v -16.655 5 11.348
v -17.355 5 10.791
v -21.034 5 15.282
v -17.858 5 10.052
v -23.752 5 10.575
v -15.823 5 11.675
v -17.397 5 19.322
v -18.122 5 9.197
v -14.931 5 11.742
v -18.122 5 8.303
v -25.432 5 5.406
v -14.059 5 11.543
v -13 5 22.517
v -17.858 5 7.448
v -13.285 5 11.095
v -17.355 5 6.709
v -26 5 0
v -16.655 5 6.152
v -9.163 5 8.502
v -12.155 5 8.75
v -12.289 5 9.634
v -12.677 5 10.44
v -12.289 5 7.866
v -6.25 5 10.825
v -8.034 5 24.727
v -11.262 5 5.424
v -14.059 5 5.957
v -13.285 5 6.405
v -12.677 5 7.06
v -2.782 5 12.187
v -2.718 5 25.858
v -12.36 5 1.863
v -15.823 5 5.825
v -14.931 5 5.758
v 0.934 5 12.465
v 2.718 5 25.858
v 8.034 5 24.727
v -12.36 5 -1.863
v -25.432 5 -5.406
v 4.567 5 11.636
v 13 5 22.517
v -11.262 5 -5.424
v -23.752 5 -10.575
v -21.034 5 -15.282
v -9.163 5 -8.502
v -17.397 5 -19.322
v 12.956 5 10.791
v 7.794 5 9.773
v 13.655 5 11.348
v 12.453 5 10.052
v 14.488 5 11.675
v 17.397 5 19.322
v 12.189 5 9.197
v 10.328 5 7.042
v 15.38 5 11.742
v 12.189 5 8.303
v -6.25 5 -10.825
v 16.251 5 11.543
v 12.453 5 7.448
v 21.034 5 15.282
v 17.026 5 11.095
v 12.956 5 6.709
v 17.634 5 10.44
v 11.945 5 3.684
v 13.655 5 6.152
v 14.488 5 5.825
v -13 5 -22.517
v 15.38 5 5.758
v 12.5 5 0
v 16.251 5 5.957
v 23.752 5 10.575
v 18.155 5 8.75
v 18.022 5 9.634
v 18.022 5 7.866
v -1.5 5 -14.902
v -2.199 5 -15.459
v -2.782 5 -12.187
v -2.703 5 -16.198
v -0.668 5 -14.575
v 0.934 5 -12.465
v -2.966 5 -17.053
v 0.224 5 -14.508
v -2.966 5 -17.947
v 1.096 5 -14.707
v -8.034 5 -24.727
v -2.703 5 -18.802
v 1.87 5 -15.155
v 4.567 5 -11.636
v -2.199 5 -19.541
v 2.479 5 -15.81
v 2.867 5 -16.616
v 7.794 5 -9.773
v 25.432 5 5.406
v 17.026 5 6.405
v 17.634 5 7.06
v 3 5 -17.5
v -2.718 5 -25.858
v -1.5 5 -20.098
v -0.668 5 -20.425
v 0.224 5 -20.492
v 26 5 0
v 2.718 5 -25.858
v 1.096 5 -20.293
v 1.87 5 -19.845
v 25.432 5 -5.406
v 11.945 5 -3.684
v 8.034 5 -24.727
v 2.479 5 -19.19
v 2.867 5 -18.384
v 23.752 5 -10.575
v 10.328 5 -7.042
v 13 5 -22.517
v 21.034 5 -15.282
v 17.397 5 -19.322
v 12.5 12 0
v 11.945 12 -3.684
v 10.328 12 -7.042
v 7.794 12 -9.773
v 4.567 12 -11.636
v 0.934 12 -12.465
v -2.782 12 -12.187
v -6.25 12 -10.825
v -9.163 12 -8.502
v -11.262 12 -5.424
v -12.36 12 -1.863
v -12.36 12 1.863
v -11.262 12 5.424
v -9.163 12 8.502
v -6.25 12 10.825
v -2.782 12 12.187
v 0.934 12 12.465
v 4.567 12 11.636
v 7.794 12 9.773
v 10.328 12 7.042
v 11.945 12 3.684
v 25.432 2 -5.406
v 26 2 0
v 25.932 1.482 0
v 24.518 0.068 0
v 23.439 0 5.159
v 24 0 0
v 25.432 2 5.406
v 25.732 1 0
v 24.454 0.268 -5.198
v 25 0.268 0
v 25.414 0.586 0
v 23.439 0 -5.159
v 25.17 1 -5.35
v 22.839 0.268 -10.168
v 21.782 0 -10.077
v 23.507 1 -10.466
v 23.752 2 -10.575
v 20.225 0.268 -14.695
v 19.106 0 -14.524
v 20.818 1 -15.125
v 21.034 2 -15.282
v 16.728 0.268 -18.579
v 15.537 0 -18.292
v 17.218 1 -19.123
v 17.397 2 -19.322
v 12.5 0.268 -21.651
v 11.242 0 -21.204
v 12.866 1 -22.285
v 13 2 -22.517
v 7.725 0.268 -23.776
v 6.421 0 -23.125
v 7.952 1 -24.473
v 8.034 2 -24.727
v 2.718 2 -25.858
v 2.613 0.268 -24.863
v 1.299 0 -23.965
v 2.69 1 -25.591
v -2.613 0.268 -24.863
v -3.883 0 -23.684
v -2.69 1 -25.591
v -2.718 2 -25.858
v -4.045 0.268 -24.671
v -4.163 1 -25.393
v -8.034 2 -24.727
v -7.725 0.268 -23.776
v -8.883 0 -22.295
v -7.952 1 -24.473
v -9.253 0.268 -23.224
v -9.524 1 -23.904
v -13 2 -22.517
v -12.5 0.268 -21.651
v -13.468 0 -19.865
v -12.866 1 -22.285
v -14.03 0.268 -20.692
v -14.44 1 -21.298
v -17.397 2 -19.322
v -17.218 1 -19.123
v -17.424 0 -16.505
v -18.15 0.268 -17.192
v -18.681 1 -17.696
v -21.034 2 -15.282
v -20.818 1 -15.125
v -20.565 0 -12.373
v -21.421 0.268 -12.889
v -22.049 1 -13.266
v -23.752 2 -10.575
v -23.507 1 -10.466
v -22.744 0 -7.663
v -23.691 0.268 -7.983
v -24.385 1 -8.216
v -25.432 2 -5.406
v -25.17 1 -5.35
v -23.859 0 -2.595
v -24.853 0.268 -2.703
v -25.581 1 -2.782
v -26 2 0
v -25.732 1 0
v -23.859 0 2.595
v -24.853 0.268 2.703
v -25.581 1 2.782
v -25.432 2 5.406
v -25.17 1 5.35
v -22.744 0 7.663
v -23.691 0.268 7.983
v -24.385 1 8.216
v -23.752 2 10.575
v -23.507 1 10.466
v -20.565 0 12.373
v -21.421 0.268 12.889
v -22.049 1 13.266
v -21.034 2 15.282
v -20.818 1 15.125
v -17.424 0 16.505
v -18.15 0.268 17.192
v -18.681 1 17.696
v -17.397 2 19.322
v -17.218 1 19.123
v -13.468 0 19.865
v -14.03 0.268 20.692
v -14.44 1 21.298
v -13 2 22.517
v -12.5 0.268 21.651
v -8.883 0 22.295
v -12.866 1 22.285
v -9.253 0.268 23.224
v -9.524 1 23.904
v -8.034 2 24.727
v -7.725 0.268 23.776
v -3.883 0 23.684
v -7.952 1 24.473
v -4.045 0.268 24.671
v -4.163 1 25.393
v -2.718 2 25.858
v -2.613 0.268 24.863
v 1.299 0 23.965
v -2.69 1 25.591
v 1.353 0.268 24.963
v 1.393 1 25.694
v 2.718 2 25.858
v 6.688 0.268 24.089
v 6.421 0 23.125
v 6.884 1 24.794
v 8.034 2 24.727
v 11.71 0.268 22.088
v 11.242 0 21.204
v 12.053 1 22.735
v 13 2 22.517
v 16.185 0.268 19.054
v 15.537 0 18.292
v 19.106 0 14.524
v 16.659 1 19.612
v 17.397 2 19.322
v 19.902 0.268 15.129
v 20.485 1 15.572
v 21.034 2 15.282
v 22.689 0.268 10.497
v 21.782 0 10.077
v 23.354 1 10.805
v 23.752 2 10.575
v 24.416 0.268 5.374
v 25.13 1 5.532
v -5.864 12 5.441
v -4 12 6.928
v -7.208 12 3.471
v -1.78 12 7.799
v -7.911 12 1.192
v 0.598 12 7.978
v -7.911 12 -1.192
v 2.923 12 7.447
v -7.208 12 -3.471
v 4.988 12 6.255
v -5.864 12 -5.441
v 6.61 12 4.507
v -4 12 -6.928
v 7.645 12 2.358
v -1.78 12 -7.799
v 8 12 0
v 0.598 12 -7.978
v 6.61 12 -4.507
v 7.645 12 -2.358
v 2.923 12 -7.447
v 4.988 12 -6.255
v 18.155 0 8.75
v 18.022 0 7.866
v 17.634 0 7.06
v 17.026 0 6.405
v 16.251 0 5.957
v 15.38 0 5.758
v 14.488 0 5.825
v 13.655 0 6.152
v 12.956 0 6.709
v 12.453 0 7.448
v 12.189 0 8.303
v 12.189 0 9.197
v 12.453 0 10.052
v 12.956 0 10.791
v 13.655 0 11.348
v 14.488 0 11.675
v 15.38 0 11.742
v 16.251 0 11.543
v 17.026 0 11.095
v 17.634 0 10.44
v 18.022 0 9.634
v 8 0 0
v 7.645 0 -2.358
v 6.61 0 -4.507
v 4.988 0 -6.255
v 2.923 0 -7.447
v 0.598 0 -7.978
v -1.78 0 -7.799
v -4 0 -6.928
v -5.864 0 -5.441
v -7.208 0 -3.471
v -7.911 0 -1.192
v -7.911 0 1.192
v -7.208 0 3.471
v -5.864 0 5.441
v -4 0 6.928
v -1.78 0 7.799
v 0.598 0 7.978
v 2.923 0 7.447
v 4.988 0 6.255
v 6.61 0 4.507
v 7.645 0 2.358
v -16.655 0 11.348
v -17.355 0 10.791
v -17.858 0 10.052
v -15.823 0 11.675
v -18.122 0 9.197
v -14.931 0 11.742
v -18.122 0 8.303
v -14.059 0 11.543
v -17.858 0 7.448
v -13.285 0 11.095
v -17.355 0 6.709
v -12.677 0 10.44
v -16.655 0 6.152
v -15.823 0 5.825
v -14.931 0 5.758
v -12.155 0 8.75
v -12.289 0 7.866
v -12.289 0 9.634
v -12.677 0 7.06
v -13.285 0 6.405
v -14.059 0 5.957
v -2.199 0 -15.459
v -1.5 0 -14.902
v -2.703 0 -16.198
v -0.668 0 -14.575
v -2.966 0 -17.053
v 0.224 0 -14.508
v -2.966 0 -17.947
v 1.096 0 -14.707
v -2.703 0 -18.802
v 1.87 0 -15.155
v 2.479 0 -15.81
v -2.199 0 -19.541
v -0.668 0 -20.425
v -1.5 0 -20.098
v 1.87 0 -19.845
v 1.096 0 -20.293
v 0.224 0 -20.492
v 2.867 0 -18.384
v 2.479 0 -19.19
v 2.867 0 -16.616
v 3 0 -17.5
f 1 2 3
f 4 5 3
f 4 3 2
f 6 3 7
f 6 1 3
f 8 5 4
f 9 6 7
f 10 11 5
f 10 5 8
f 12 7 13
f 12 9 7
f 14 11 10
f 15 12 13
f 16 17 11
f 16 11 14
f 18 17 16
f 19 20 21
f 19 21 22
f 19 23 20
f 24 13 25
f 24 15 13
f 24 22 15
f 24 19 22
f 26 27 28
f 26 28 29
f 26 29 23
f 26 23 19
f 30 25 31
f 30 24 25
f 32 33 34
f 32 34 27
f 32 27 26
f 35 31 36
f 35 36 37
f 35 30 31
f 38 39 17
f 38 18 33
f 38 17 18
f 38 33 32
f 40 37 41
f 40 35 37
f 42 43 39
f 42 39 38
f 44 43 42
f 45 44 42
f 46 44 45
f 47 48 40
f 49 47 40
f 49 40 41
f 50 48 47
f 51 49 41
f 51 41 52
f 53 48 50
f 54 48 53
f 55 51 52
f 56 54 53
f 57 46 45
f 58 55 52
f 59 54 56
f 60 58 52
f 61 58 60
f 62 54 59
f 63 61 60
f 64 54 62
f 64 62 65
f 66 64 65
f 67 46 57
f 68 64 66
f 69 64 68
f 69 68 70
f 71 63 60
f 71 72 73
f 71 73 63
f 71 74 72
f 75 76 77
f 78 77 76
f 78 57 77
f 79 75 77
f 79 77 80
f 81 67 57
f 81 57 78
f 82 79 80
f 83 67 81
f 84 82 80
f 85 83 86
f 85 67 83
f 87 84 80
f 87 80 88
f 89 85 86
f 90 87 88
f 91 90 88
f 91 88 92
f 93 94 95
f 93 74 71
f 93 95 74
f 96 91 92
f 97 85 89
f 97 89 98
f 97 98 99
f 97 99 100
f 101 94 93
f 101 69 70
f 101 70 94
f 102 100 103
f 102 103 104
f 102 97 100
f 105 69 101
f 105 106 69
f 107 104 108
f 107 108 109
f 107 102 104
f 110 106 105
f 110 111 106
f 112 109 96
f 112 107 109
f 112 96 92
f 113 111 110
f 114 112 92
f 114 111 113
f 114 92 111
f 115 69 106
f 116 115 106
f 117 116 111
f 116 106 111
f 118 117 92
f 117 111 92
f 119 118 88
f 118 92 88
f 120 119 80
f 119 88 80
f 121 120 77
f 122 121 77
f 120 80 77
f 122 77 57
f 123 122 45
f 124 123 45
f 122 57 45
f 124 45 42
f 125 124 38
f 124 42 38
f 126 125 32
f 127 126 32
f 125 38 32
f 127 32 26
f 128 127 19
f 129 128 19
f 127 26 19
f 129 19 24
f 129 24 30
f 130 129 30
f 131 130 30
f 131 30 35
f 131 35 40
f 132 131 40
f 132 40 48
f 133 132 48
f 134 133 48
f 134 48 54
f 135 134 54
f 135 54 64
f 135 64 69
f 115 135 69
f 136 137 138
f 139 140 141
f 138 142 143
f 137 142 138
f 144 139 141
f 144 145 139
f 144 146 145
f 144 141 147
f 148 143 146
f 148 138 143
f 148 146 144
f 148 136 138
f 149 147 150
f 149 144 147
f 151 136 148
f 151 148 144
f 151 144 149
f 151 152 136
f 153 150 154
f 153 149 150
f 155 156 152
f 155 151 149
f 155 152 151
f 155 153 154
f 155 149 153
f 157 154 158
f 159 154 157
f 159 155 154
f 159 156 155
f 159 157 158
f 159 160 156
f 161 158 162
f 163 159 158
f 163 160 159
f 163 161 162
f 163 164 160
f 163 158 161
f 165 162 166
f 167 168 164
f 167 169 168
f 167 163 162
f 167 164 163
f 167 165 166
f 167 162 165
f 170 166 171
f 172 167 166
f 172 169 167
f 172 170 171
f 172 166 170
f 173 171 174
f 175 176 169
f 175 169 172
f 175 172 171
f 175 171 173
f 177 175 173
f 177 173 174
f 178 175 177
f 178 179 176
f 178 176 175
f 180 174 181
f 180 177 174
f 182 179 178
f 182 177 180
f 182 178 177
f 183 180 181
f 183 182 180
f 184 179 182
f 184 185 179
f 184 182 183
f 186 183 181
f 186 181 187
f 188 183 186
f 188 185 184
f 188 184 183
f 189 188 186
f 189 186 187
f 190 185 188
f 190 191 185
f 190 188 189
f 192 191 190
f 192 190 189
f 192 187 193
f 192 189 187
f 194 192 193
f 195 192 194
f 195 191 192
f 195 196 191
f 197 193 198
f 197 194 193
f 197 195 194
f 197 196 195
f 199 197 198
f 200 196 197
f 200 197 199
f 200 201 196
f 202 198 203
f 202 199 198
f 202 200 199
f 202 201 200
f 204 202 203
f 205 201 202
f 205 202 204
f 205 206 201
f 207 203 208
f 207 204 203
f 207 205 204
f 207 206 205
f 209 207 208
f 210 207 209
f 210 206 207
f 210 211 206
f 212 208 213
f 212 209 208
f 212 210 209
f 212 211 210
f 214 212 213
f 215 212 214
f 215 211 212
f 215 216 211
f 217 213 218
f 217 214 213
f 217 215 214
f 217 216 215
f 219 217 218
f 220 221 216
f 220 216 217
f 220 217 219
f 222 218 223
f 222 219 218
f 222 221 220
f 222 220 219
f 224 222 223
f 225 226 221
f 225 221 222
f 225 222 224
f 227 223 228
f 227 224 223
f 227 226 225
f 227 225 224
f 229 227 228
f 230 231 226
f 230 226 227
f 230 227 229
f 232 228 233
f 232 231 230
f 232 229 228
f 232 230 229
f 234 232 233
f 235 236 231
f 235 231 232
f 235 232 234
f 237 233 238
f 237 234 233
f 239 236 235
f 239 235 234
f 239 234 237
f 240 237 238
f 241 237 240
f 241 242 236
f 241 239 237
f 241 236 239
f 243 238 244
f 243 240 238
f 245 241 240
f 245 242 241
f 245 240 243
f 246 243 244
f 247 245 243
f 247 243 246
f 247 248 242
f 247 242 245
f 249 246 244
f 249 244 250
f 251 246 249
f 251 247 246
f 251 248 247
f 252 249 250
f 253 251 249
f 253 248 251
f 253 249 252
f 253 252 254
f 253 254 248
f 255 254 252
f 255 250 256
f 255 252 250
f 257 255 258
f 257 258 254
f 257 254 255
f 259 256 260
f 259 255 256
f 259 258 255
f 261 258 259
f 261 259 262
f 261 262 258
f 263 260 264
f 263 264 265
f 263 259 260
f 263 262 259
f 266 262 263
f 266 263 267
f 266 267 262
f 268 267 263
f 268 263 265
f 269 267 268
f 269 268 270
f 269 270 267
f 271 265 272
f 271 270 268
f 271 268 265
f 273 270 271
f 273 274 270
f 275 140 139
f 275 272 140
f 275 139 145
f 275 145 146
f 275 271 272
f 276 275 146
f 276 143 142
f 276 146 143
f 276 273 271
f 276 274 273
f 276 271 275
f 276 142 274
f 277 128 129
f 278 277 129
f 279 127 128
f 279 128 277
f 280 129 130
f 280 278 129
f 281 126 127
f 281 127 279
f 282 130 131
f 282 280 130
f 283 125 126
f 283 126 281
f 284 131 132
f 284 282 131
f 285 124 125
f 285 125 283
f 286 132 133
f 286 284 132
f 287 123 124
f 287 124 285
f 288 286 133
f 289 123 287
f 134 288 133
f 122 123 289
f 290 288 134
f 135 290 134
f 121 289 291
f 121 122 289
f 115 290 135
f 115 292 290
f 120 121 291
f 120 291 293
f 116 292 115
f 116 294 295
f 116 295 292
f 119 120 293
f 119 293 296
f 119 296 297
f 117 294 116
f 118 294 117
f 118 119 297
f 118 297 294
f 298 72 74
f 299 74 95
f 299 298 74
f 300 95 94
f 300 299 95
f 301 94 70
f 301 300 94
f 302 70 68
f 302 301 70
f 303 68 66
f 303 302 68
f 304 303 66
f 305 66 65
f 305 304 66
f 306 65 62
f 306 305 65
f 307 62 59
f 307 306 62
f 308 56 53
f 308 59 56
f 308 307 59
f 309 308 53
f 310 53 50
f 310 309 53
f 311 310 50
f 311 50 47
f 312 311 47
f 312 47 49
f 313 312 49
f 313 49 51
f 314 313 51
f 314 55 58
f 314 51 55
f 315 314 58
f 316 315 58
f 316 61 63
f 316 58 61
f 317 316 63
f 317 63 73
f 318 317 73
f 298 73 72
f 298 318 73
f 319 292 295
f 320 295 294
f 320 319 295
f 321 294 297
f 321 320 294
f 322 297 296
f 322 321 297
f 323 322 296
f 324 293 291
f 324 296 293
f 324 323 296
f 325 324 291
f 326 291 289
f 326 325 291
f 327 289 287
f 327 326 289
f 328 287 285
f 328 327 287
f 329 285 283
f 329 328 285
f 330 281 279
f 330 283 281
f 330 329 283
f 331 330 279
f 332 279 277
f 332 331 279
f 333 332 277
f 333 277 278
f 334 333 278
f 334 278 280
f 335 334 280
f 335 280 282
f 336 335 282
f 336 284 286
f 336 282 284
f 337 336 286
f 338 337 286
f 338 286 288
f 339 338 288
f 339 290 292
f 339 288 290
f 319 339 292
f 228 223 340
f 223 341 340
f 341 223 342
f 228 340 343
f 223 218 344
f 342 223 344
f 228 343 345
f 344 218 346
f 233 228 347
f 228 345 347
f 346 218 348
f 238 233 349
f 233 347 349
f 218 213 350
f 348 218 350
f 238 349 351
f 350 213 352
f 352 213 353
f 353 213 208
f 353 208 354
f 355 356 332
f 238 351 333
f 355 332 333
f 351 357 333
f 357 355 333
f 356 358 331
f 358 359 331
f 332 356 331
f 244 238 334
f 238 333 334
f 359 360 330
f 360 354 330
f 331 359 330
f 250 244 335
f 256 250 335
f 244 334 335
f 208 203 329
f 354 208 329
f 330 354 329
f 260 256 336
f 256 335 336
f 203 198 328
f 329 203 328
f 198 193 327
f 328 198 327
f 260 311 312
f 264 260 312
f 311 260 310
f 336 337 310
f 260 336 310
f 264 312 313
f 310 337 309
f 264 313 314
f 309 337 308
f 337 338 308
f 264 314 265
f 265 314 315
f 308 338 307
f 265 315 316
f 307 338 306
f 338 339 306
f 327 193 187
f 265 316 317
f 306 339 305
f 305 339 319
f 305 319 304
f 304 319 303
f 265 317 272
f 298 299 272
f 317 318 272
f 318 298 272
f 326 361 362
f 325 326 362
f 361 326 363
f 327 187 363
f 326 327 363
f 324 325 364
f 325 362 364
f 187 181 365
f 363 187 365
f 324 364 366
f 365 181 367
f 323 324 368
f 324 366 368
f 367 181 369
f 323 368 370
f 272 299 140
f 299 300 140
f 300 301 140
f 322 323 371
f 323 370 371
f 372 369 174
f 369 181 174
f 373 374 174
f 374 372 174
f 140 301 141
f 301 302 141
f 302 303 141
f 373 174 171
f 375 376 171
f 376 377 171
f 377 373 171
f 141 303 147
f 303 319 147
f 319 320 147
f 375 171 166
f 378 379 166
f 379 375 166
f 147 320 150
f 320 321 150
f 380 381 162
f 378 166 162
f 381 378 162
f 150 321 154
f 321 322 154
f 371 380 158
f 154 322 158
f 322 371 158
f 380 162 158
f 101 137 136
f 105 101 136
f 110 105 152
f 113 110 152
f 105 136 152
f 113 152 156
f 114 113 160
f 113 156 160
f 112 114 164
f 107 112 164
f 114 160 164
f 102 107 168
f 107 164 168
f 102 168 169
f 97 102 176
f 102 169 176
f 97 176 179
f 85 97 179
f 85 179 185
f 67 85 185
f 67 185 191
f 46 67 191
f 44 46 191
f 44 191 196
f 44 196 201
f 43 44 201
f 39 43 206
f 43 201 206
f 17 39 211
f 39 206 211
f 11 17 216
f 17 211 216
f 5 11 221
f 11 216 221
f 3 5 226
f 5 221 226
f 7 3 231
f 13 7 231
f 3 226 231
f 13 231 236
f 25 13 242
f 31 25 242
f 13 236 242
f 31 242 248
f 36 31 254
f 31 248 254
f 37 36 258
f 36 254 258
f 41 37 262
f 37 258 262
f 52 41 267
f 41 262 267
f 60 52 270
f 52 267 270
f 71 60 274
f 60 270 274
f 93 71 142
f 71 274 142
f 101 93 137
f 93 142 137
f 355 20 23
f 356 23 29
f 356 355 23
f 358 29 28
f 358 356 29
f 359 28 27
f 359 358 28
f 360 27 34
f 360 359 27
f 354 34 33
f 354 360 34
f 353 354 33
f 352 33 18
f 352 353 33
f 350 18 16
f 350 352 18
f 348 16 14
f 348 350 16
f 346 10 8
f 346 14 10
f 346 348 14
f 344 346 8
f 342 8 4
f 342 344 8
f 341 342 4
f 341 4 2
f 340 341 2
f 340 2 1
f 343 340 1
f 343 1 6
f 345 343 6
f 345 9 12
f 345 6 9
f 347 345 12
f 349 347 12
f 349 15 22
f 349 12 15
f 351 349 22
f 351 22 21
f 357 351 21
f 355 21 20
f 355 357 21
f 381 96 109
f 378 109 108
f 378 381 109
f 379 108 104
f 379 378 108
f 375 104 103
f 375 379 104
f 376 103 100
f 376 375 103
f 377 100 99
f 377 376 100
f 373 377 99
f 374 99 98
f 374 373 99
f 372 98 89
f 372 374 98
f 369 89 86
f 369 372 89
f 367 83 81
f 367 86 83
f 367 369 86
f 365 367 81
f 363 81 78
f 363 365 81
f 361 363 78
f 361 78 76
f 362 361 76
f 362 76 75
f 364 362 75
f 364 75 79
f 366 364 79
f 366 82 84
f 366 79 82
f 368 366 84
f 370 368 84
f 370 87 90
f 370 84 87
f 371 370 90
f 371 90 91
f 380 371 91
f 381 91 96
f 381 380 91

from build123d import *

# Parameters (mm, degrees)
SKETCH1_R               = 26
BOSS_EXTRUDE1_DEPTH     = 5
SKETCH1_3_R             = 3
CUT_EXTRUDE1_DEPTH      = 6
CUT_EXTRUDE1_DEPTH_BACK = 1
SKETCH1_4_R             = 12.5
BOSS_EXTRUDE2_DEPTH     = 12
SKETCH1_5_R             = 8
CUT_EXTRUDE2_DEPTH      = 13
CUT_EXTRUDE2_DEPTH_BACK = 1
FILLET1_R               = 2


with BuildPart() as part:
    # Sketch1 → Boss-Extrude1 (new body)
    with BuildSketch(Plane(origin=(0, 0, 0), x_dir=(1, 0, 0), z_dir=(0, 1, 0))):
        Circle(SKETCH1_R)
    extrude(amount=BOSS_EXTRUDE1_DEPTH)

    # Sketch1<3> → Cut-Extrude1 (cut, two sides)
    with BuildSketch(Plane(origin=(0, 0, 0), x_dir=(1, 0, 0), z_dir=(0, 1, 0))) as cut_extrude1_sk:
        with Locations((0, 17.5)):
            Circle(SKETCH1_3_R)
        with Locations((15.155444566, -8.75)):
            Circle(SKETCH1_3_R)
        with Locations((-15.155444566, -8.75)):
            Circle(SKETCH1_3_R)
    extrude(amount=CUT_EXTRUDE1_DEPTH, mode=Mode.SUBTRACT)
    extrude(cut_extrude1_sk.sketch, amount=-CUT_EXTRUDE1_DEPTH_BACK, mode=Mode.SUBTRACT)

    # Sketch1<4> → Boss-Extrude2 (add)
    with BuildSketch(Plane(origin=(0, 0, 0), x_dir=(1, 0, 0), z_dir=(0, 1, 0))):
        Circle(SKETCH1_4_R)
    extrude(amount=BOSS_EXTRUDE2_DEPTH)

    # Sketch1<5> → Cut-Extrude2 (cut, two sides)
    with BuildSketch(Plane(origin=(0, 0, 0), x_dir=(1, 0, 0), z_dir=(0, 1, 0))) as cut_extrude2_sk:
        Circle(SKETCH1_5_R)
    extrude(amount=CUT_EXTRUDE2_DEPTH, mode=Mode.SUBTRACT)
    extrude(cut_extrude2_sk.sketch, amount=-CUT_EXTRUDE2_DEPTH_BACK, mode=Mode.SUBTRACT)

    # Fillet1
    fillet1_edges = [part.edges().sort_by_distance(p)[0] for p in [
        (-26, 0, 0),
    ]]
    fillet(fillet1_edges, radius=FILLET1_R)


solid = part.part
